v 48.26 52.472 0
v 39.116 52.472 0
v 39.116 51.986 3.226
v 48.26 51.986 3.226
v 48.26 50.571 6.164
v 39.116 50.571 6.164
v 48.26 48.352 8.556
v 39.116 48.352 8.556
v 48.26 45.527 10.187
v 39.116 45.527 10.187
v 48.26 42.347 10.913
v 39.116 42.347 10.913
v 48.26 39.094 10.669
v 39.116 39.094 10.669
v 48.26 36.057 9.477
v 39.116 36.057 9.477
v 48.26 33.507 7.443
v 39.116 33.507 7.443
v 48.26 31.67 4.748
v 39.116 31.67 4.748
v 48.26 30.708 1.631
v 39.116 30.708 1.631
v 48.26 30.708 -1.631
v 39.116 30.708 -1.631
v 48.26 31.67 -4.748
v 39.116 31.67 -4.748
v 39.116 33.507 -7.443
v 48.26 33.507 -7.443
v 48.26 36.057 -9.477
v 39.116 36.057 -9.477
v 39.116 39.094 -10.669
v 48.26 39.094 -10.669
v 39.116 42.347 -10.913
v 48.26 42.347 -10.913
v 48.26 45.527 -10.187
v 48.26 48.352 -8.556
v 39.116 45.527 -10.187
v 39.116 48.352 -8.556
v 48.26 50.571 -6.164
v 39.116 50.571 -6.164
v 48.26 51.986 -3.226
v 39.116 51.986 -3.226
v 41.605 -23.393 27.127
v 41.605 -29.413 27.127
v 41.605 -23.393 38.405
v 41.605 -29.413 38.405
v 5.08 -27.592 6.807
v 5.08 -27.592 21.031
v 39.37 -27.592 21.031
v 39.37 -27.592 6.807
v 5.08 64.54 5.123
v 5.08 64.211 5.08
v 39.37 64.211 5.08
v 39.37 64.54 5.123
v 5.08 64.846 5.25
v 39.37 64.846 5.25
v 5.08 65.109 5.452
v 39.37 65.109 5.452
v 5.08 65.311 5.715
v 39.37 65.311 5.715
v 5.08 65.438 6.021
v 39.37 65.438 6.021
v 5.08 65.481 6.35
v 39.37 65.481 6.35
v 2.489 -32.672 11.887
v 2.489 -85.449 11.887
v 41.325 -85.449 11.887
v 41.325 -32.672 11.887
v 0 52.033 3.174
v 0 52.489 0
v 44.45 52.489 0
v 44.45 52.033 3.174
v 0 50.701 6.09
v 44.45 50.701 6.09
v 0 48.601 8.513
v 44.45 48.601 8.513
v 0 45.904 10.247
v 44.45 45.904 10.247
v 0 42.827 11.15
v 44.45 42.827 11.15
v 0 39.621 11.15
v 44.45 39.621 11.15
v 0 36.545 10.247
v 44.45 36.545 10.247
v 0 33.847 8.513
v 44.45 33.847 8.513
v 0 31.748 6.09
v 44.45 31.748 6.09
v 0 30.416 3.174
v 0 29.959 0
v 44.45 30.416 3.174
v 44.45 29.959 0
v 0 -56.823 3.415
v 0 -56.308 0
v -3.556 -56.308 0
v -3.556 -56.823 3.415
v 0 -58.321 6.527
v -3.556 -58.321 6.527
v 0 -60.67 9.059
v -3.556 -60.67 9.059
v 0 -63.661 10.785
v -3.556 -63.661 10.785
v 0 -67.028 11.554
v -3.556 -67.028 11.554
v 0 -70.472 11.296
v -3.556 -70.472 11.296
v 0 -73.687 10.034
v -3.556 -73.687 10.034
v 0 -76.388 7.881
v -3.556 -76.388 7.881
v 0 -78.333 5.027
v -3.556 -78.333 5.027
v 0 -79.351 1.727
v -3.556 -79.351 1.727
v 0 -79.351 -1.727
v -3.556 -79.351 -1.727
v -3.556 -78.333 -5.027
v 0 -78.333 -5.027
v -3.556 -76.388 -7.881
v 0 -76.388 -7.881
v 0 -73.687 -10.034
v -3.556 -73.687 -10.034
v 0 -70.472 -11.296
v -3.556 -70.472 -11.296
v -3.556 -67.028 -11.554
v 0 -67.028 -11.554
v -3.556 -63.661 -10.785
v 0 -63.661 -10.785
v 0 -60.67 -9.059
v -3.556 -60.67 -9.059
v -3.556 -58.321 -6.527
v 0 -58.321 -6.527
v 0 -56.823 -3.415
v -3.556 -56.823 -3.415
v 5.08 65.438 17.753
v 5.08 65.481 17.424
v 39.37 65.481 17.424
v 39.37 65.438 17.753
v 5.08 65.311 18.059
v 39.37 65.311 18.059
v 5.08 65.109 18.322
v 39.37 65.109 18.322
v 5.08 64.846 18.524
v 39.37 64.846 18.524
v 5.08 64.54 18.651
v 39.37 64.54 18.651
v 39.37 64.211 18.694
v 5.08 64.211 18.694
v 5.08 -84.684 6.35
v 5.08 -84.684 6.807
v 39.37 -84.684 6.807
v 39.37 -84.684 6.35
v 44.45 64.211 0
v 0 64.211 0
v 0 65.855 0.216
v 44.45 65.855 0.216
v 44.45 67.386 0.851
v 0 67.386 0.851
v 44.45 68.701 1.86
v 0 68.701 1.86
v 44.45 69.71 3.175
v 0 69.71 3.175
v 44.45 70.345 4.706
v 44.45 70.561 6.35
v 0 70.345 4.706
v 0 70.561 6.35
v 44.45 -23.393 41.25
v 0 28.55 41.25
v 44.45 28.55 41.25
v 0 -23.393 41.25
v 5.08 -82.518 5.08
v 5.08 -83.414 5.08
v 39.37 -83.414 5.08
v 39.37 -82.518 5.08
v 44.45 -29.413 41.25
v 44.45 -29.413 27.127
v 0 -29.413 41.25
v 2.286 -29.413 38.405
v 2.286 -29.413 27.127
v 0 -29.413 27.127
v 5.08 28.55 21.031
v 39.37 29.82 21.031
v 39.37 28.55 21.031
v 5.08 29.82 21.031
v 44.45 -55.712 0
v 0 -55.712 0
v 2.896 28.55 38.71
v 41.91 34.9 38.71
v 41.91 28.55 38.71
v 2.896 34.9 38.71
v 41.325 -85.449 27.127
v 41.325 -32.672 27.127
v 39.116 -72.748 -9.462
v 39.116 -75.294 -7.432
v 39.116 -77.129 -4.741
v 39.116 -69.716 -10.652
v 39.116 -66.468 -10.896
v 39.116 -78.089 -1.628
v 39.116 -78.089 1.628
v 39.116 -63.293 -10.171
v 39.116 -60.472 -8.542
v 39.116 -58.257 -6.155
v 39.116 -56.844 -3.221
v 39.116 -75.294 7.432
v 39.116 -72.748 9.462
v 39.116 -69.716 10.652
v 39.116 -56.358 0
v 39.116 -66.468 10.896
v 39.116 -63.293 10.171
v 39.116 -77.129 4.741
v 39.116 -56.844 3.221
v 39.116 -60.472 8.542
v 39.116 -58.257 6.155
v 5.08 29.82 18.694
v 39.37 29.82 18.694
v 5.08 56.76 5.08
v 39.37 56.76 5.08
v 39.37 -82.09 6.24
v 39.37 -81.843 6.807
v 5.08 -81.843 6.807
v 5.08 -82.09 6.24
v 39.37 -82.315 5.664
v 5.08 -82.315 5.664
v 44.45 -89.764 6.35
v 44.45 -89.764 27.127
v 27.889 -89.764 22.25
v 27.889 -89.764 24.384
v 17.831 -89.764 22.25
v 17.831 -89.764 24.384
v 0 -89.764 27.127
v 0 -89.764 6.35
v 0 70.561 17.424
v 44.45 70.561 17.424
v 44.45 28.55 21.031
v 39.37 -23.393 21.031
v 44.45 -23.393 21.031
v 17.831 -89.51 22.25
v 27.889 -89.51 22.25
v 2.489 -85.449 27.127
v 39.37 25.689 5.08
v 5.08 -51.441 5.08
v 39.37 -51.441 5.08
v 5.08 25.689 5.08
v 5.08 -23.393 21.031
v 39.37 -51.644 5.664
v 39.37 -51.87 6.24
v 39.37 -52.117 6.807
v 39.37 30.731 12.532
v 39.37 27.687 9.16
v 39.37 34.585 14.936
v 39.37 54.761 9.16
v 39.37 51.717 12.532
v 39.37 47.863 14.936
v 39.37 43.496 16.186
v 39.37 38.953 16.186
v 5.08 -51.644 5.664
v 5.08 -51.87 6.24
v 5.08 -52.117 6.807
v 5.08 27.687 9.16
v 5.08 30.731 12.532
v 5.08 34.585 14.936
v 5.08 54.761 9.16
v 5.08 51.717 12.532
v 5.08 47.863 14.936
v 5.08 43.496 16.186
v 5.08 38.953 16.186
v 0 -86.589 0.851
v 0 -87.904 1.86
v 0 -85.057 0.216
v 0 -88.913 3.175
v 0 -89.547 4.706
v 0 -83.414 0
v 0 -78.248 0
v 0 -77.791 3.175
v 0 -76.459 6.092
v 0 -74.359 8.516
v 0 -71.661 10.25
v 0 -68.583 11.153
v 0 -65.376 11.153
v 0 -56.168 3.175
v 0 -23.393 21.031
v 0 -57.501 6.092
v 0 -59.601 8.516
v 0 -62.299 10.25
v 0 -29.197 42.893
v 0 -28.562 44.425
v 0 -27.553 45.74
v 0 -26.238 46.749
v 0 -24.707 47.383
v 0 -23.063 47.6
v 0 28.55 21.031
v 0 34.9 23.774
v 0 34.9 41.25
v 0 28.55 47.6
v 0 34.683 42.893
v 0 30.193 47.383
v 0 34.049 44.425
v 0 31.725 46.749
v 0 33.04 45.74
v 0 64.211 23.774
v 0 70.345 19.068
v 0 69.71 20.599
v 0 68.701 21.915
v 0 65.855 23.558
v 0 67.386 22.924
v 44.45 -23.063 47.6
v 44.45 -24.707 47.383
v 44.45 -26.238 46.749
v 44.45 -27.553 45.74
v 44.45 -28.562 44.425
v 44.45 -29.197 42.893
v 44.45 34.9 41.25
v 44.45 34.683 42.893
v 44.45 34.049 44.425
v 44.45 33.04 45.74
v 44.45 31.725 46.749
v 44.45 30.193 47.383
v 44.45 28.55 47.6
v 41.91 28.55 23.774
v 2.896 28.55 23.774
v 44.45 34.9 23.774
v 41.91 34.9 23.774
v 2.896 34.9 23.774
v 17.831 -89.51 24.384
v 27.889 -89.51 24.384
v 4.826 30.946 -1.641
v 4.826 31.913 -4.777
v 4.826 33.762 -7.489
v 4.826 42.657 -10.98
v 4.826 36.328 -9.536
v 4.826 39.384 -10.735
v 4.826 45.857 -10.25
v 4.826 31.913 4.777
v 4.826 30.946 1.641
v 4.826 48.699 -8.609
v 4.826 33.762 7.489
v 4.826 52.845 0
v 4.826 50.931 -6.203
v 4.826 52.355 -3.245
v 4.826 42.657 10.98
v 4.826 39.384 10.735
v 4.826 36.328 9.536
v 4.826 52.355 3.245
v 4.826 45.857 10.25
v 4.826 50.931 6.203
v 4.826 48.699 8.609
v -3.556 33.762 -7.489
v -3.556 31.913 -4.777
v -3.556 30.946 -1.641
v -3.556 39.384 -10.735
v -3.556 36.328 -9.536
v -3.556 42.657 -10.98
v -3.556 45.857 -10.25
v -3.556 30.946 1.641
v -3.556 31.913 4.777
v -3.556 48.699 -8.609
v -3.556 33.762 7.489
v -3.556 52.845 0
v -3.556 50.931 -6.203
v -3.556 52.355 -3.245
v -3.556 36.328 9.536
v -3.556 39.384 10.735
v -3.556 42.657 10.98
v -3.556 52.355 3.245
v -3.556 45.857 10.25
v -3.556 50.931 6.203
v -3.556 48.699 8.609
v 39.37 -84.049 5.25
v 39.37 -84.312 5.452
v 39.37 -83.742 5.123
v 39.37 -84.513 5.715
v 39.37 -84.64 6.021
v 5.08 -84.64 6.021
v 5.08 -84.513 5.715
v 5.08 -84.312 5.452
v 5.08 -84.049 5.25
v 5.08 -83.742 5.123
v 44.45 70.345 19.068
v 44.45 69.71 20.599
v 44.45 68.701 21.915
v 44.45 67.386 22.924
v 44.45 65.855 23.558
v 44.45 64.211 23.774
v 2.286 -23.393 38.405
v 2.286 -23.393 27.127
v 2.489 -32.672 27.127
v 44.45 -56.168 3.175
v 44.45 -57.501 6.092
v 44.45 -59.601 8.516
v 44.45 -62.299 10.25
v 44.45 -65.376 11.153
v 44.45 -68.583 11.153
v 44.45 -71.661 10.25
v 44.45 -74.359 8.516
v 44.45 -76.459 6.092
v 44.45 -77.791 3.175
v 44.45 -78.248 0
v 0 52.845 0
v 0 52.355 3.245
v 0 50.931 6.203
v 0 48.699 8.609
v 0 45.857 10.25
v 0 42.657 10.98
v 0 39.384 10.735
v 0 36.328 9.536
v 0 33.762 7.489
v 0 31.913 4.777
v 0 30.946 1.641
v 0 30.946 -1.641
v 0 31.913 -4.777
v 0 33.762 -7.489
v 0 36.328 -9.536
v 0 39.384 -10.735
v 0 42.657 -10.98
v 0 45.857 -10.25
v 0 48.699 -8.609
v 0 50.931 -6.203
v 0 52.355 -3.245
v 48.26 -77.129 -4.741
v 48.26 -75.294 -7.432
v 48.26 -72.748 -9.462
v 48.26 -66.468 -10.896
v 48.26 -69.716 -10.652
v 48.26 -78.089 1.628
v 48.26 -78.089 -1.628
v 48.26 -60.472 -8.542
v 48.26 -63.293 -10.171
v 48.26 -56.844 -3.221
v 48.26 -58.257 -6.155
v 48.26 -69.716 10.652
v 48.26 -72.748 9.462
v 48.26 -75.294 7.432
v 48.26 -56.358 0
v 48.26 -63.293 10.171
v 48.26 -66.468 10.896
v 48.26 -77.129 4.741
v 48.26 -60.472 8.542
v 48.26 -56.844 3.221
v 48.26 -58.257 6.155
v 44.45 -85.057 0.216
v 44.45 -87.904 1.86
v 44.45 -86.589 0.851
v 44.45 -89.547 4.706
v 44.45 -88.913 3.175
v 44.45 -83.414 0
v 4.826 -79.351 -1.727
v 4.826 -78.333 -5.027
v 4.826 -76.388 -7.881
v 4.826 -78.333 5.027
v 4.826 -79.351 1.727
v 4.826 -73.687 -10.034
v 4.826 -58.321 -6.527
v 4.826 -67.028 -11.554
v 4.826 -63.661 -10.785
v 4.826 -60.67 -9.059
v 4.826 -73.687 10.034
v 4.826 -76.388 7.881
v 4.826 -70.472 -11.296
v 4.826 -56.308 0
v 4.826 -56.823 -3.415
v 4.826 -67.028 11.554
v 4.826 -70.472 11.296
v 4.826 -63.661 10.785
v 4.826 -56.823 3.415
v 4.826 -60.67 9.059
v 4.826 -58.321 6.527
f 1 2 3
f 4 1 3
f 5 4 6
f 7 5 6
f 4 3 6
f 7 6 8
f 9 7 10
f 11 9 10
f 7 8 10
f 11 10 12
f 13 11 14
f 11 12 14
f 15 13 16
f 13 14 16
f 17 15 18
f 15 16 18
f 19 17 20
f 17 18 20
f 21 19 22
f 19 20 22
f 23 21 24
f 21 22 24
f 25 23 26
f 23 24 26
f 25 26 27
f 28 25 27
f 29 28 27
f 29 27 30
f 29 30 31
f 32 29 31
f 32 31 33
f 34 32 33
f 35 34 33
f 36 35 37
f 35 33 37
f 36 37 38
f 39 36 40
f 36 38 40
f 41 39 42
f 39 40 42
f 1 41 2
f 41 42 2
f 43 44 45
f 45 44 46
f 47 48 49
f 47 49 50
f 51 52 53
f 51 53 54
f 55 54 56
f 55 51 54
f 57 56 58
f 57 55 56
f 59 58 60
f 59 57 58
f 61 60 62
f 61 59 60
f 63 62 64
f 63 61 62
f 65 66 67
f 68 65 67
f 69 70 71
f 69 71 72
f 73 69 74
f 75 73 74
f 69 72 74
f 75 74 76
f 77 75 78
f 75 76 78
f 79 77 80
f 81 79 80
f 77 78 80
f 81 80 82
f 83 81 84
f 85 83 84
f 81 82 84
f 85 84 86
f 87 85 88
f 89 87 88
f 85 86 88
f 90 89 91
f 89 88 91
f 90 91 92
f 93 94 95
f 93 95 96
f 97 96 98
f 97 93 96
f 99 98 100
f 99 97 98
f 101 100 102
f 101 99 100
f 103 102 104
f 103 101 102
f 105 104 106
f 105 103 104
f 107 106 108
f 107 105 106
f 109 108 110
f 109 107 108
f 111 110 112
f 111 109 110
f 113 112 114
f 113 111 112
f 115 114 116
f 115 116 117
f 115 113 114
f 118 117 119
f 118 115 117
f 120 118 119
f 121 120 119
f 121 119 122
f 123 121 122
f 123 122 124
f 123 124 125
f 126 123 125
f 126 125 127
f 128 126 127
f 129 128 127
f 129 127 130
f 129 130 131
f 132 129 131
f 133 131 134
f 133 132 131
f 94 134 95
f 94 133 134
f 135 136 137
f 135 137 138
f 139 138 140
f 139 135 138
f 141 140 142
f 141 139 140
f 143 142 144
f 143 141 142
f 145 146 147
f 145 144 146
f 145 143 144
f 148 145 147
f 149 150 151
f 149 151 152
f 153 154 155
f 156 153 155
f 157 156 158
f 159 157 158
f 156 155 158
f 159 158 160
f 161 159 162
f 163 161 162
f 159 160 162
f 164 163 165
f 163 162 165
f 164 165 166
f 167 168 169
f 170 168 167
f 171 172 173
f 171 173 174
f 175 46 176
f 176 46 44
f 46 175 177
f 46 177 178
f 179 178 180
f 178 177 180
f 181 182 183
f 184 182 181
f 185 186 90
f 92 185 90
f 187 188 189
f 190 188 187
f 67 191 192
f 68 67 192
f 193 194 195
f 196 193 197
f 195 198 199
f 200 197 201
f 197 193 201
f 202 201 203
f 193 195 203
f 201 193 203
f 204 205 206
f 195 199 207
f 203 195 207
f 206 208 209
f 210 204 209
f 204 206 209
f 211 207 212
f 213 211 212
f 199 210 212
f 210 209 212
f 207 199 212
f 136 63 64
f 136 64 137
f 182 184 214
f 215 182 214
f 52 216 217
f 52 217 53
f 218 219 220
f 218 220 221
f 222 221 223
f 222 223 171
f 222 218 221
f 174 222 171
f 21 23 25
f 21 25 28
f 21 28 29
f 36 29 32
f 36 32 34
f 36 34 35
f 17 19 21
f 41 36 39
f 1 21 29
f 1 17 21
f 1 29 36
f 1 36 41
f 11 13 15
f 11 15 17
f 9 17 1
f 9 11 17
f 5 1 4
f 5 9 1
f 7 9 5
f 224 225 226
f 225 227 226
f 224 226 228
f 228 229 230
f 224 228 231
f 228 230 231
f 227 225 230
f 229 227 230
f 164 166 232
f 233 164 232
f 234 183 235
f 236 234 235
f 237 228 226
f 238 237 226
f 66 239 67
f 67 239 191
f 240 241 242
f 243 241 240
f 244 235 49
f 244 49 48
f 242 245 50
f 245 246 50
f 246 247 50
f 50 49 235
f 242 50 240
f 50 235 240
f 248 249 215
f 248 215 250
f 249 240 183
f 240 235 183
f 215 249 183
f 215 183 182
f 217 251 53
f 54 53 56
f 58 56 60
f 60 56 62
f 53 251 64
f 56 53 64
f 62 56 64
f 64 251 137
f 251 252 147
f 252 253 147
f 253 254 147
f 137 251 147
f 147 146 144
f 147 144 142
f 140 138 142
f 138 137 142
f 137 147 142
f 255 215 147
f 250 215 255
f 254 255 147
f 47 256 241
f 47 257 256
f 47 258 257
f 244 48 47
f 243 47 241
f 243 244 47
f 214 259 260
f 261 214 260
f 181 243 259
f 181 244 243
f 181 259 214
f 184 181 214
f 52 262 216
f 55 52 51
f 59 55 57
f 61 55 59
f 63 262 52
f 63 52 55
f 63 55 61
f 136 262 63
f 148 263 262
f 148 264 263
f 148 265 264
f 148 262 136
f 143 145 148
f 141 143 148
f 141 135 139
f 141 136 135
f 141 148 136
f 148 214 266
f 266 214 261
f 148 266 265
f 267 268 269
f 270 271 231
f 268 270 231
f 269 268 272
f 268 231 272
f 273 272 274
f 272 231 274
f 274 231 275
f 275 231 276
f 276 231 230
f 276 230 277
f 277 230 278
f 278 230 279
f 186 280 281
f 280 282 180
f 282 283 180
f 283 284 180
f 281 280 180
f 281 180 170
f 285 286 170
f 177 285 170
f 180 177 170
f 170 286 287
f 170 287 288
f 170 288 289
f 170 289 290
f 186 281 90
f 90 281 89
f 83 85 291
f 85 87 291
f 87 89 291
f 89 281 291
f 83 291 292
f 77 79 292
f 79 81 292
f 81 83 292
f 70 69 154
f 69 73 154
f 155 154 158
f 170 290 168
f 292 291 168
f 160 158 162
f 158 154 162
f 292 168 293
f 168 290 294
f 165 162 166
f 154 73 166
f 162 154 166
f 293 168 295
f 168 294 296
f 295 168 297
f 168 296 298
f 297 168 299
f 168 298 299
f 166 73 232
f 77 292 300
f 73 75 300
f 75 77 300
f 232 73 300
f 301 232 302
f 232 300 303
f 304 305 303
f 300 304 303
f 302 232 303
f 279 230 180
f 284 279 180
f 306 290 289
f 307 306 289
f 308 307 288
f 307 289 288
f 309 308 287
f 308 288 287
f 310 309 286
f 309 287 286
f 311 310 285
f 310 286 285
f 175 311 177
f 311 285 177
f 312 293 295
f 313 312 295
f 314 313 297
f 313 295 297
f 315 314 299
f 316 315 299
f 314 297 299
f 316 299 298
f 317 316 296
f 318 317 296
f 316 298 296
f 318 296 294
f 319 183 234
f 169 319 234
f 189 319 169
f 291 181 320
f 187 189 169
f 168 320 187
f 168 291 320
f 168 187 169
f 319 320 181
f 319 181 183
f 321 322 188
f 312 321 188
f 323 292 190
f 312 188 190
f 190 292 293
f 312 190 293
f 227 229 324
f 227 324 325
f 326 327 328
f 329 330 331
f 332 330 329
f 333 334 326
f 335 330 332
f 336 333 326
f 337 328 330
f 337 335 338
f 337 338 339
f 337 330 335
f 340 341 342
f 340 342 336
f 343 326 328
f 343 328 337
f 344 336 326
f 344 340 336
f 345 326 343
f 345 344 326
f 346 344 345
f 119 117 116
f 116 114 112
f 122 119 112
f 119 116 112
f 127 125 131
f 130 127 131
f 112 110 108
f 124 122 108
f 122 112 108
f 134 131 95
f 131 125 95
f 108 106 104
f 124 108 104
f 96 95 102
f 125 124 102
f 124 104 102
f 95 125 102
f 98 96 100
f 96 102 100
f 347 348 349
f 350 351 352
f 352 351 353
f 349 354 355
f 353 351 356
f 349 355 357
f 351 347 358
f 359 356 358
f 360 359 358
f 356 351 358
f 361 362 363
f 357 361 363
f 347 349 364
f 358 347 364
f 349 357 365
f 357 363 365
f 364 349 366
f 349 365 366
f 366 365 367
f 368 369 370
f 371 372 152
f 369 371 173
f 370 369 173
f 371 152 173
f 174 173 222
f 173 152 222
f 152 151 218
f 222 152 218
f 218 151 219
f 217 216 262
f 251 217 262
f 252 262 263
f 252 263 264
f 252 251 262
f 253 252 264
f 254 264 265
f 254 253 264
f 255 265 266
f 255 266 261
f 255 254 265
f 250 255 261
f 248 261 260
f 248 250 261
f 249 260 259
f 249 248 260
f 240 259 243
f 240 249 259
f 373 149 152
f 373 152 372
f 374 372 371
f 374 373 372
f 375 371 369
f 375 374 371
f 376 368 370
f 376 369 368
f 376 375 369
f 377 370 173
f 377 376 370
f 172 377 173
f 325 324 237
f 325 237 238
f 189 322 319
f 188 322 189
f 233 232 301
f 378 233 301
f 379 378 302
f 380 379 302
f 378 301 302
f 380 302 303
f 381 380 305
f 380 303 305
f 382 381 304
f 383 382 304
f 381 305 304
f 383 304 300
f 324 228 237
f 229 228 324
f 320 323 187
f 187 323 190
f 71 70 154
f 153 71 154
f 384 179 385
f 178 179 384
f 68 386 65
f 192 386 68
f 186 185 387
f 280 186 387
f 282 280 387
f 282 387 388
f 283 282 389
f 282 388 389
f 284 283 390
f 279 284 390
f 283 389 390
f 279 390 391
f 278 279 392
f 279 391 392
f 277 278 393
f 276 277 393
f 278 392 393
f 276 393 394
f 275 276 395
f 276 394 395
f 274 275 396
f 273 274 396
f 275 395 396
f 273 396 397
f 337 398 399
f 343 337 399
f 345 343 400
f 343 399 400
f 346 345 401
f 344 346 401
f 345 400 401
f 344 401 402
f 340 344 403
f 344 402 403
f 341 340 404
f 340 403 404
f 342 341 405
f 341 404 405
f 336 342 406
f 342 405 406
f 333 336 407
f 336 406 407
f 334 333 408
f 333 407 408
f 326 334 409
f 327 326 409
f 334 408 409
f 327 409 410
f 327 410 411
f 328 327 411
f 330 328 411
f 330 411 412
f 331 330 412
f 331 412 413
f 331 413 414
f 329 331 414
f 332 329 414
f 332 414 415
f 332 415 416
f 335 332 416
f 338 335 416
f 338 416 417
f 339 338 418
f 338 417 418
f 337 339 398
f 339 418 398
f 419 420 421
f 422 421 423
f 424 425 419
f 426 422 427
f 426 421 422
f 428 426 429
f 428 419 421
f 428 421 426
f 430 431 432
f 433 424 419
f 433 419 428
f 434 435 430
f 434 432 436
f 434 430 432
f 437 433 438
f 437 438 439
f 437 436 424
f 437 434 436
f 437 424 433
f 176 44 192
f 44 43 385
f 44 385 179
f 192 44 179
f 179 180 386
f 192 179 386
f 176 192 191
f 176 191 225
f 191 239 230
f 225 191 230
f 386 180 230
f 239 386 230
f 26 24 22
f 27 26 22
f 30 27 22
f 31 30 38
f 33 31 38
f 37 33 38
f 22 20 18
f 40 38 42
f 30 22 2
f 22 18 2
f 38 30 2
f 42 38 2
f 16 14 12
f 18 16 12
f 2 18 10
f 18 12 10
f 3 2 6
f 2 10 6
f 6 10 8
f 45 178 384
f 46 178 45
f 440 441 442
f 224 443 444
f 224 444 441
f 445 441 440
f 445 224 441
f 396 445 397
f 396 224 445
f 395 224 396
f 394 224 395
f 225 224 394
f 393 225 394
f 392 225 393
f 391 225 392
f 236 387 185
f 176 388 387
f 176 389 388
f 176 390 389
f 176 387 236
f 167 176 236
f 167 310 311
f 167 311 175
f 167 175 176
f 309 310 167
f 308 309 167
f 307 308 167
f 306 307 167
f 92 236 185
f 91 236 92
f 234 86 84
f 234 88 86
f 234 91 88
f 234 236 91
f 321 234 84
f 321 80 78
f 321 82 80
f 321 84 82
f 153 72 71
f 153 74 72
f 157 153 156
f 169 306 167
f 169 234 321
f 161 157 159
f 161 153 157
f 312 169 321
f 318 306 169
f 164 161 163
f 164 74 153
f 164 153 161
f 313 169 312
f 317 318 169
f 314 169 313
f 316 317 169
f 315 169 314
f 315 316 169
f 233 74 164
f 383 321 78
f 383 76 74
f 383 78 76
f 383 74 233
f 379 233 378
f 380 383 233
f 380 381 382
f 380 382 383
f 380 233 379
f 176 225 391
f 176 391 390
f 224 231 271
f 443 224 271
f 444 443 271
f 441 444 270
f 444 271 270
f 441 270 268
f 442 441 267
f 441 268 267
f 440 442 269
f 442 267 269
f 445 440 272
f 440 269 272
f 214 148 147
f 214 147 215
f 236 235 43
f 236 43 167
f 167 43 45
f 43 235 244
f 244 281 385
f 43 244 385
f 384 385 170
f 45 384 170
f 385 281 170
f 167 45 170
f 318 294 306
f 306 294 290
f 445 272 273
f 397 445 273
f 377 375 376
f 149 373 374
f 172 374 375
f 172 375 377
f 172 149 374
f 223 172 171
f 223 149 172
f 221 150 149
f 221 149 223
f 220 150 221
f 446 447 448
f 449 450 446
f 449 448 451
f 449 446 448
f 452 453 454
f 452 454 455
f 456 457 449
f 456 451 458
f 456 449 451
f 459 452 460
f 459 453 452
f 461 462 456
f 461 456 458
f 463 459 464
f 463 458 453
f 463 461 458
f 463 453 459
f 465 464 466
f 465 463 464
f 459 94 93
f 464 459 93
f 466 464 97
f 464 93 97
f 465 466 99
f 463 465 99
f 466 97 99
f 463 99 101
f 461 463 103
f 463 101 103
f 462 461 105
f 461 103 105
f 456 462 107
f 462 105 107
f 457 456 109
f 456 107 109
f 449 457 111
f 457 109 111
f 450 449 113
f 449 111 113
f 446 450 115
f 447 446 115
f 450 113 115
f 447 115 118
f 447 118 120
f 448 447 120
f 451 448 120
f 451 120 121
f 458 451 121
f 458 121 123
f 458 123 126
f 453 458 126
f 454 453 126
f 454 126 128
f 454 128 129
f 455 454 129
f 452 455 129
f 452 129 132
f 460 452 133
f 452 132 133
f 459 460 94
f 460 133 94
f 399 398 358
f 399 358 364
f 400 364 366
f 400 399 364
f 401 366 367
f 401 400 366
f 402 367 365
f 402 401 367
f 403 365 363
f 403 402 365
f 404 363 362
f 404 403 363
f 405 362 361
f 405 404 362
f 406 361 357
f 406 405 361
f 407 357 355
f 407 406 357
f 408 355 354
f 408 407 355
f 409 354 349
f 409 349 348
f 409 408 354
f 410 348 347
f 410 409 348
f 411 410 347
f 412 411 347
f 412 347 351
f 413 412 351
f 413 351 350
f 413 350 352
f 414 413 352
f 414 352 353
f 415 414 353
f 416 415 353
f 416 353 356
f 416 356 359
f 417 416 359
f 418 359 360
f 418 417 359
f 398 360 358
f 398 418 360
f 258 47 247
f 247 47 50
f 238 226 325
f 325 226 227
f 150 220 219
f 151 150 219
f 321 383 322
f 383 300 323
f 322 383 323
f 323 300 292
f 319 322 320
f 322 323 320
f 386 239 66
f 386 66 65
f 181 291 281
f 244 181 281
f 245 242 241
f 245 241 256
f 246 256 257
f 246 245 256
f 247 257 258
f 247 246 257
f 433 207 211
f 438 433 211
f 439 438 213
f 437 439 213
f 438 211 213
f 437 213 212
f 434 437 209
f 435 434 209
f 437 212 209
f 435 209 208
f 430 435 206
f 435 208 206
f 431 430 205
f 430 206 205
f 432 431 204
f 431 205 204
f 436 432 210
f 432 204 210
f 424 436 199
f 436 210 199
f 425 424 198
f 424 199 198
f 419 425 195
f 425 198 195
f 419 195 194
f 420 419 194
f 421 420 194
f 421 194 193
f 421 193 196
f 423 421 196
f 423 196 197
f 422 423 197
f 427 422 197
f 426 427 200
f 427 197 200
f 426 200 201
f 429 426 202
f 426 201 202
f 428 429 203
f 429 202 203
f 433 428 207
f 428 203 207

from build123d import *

# Parameters (mm, degrees)
F1_DEPTH      = 44.45
F3_DEPTH      = 46.99
F4_W          = 38.835483836
F4_H          = 52.7764223516
F5_DEPTH      = 15.24
F7_START      = 39.116
F6_R          = 10.9261370184
F7_DEPTH      = 9.144
F6_R_2        = 10.9431249162
F8_R          = 11.010831959
F9_DEPTH      = 3.556
F9_DEPTH_BACK = 4.826
F8_R_2        = 11.5864067576
F10_W         = 10.0583992898
F10_H         = 2.1336004138
F11_DEPTH     = 0.254
F12_W         = 51.9430035889
F12_H         = 20.2183979881
F13_DEPTH     = 55.118
F14_W         = 39.3191990443
F14_H         = 11.2776011229
F15_DEPTH     = 25.4
F16_T         = 5.08
F16_T3_DEPTH  = 54.61
F16_T5_DEPTH  = 12.4460015742
F16_T7_DEPTH  = 13.0047993815
F16_T9_DEPTH  = 16.1797990388
F16_T11_DEPTH = 25.4
F16_T13_DEPTH = 62.9364223516
F16_T15_DEPTH = 48.995483836
F16_T17_DEPTH = 10.414
F16_T19_DEPTH = 12.2936004138
F16_T21_DEPTH = 20.2183992898
F17_W         = 39.0143997502
F17_H         = 14.9351991713
F18_DEPTH     = 25.4


# Not quite as in the source:
# - a shell that OpenCascade refuses in one call is made with other operations: the cavity is built on its own and cut out


with BuildPart() as f1:
    # F0 (on Right) → F1 (new body)
    with BuildSketch(Plane.YZ):
        with BuildLine():
            Line((34.8995998502, 0), (34.8995998502, 23.7744003534))
            Line((34.8995998502, 23.7744003534), (34.8995998502, 41.2495988739))
            ThreePointArc((34.8995998502, 41.2495988739), (33.0397279107, 45.7397269344), (28.5495998502, 47.5995988739))
            Line((28.5495998502, 47.5995988739), (-23.0632027775, 47.5995988739))
            ThreePointArc((-23.0632027775, 47.5995988739), (-27.553330838, 45.7397269344), (-29.4132027775, 41.2495988739))
            Line((-29.4132027775, 41.2495988739), (-29.4132027775, 27.127198875))
            Line((-29.4132027775, 27.127198875), (-29.4132027775, 0))
            Line((-29.4132027775, 0), (34.8995998502, 0))
        make_face()
        with BuildLine():
            Line((-83.4136041045, 0), (-29.4132027775, 0))
            Line((-29.4132027775, 0), (-29.4132027775, 27.127198875))
            Line((-29.4132027775, 27.127198875), (-89.7636041045, 27.127198875))
            Line((-89.7636041045, 27.127198875), (-89.7636041045, 6.35))
            ThreePointArc((-89.7636041045, 6.35), (-87.9037321651, 1.8598719395), (-83.4136041045, 0))
        make_face()
        with BuildLine():
            Line((64.2112003803, 23.7744003534), (34.8995998502, 23.7744003534))
            Line((34.8995998502, 23.7744003534), (34.8995998502, 0))
            Line((34.8995998502, 0), (64.2112003803, 0))
            ThreePointArc((64.2112003803, 0), (68.7013284409, 1.8598719395), (70.5612003803, 6.35))
            Line((70.5612003803, 6.35), (70.5612003803, 17.4244003534))
            ThreePointArc((70.5612003803, 17.4244003534), (68.7013284409, 21.914528414), (64.2112003803, 23.7744003534))
        make_face()
    extrude(amount=F1_DEPTH)

    # F2 (on face) → F3 (cut)
    with BuildSketch(Plane.YZ.offset(44.45)):
        with BuildLine():
            ThreePointArc((52.4891002785, 0), (41.2242002785, 11.2649), (29.9593002785, 0))
            Line((29.9593002785, 0), (52.4891002785, 0))
        make_face()
        with BuildLine():
            Line((-78.2477574524, 0), (-55.7118488375, 0))
            ThreePointArc((-55.7118488375, 0), (-66.9798031449, 11.2679543074), (-78.2477574524, 0))
        make_face()
        with BuildLine():
            Line((52.4891002785, 0), (29.9593002785, 0))
            ThreePointArc((29.9593002785, 0), (41.2242002785, -11.2649), (52.4891002785, 0))
        make_face()
        with BuildLine():
            ThreePointArc((-78.2477574524, 0), (-66.9798031449, -11.2679543074), (-55.7118488375, 0))
            Line((-55.7118488375, 0), (-78.2477574524, 0))
        make_face()
    extrude(amount=-F3_DEPTH, mode=Mode.SUBTRACT)

    # F4 (on face) → F5 (cut)
    with BuildSketch(Plane.XY.offset(27.127198875)):
        with Locations((21.9071976608, -59.0603370219)):
            Rectangle(F4_W, F4_H)
    extrude(amount=-F5_DEPTH, mode=Mode.SUBTRACT)

    # F10 (on face) → F11 (cut)
    with BuildSketch(Plane.XZ.offset(89.7636041045)):
        with Locations((22.85999991, 23.317201063)):
            Rectangle(F10_W, F10_H)
    extrude(amount=-F11_DEPTH, mode=Mode.SUBTRACT)

    # F12 (on face) → F13 (cut)
    with BuildSketch(Plane(origin=(0, 0, 0), x_dir=(0, -1, 0), z_dir=(-1, 0, 0))):
        with Locations((-2.5780980557, 31.1403998798)):
            Rectangle(F12_W, F12_H)
    extrude(amount=-F13_DEPTH, mode=Mode.SUBTRACT)

    # F14 (on face) → F15 (cut)
    with BuildSketch(Plane.XZ.offset(29.4132027775)):
        with Locations((21.9456010964, 32.7659994364)):
            Rectangle(F14_W, F14_H)
    extrude(amount=-F15_DEPTH, mode=Mode.SUBTRACT)

    # F16: shell of thickness 5.08, made by hand


with BuildPart() as f7:
    # F6 (on Right) → F7 (new body)
    with BuildSketch(Plane.YZ.offset(F7_START)):
        with Locations((-67.2845989466, 0)):
            Circle(F6_R)
    extrude(amount=F7_DEPTH)


with BuildPart() as f7b:
    # F6 (on Right) → F7, piece 2 (new body)
    with BuildSketch(Plane.YZ.offset(F7_START)):
        with Locations((41.5289998055, 0)):
            Circle(F6_R_2)
    extrude(amount=F7_DEPTH)


with BuildPart() as f9:
    # F8 (on Right) → F9 (new body, two sides)
    with BuildSketch(Plane.YZ) as f9_sk:
        with Locations((41.8337993324, 0)):
            Circle(F8_R)
    extrude(amount=-F9_DEPTH)
    extrude(f9_sk.sketch, amount=F9_DEPTH_BACK)


with BuildPart() as f9b:
    # F8 (on Right) → F9, piece 2 (new body, two sides)
    with BuildSketch(Plane.YZ) as f9_2_sk:
        with Locations((-67.8941980004, 0)):
            Circle(F8_R_2)
    extrude(amount=-F9_DEPTH)
    extrude(f9_2_sk.sketch, amount=F9_DEPTH_BACK)


with BuildPart() as f16_core1:
    # F16_t2: copy of F1
    add(f1.part)

    # the walls: a layer under each face that stays
    f16_faces = [f16_core1.faces().sort_by_distance(p)[0] for p in [
        (22.225, 34.8995998502, 32.5119996136),
        (22.225, 49.5554001153, 23.7744003534),
        (22.225, 33.0397279107, 45.7397269344),
        (0, -63.042803357, 23.7997994369),
        (44.45, -63.042803357, 23.7997994369),
        (22.225, 68.7013284409, 21.914528414),
        (22.225, 2.7431985363, 47.5995988739),
        (22.225, 70.5612003803, 11.8872001767),
        (22.225, 68.7013284409, 1.8598719395),
        (22.225, 58.3501503294, 0),
        (22.225, -27.553330838, 45.7397269344),
        (22.225, 41.2242002785, 11.2649),
        (37.0416666667, -29.4132027775, 38.8958655407),
        (22.225, -12.8762742795, 0),
        (41.275, -28.1341323363, 27.127198875),
        (22.225, -66.9798031449, 11.2679543074),
        (22.225, -89.7636041045, 16.7385994375),
        (22.225, -80.8306807784, 0),
        (22.225, -87.9037321651, 1.8598719395),
        (22.225, 28.5495998502, 31.1403998798),
        (22.225, 2.5780980557, 41.2495988739),
        (37.0416666667, -23.3934037387, 24.4009338838),
        (2.2860015742, -26.4033032581, 32.7659994364),
        (21.9456010964, -26.4033032581, 38.4047999978),
        (41.6052006185, -26.4033032581, 32.7659994364),
        (41.3249395788, -59.0603370219, 19.507198875),
        (21.9071976608, -85.4485481977, 19.507198875),
        (2.4894557428, -59.0603370219, 19.507198875),
        (21.9071976608, -32.6721258461, 19.507198875),
        (27.8891995549, -89.6366041045, 23.317201063),
        (22.85999991, -89.6366041045, 22.2504008561),
        (17.8308002651, -89.6366041045, 23.317201063),
        (22.85999991, -89.6366041045, 24.3840012699),
        (21.9071976608, -59.0603370219, 11.887198875),
        (22.85999991, -89.5096041045, 23.317201063),
    ]]
    thicken(f16_faces, amount=-F16_T, mode=Mode.SUBTRACT)

    # F16_s4 → F16_t3 (cut)
    with BuildSketch(Plane.YZ.offset(-5.08)):
        Polygon((34.9503998502, 23.8252003534), (29.8195998502, 23.7744003534), (29.8195998502, 18.6944003534), (34.8995998502, 18.6944003534), align=None)
        Polygon((28.4987998502, 41.1987988739), (33.6295998502, 41.2495988739), (33.6295998502, 46.3295988739), (28.5495998502, 46.3295988739), align=None)
        Polygon((-23.3426037387, 41.1987988739), (-23.3934037387, 46.3295988739), (-28.4734037387, 46.3295988739), (-28.4734037387, 41.2495988739), align=None)
    extrude(amount=F16_T3_DEPTH, mode=Mode.SUBTRACT)

    # F16_s6 → F16_t5 (cut)
    with BuildSketch(Plane.YZ.offset(-5.08)):
        Polygon((-29.4640027775, 27.177998875), (-24.3332027775, 27.127198875), (-24.3332027775, 22.047198875), (-29.4132027775, 22.047198875), align=None)
    extrude(amount=F16_T5_DEPTH, mode=Mode.SUBTRACT)

    # F16_s8 → F16_t7 (cut)
    with BuildSketch(Plane.YZ.offset(36.5252006185)):
        Polygon((-29.4640027775, 27.177998875), (-24.3332027775, 27.127198875), (-24.3332027775, 22.047198875), (-29.4132027775, 22.047198875), align=None)
    extrude(amount=F16_T7_DEPTH, mode=Mode.SUBTRACT)

    # F16_s10 → F16_t9 (cut)
    with BuildSketch(Plane.XZ.offset(18.3134037387)):
        Polygon((2.3368015742, 27.177998875), (2.2860015742, 22.047198875), (-2.7939984258, 22.047198875), (-2.7939984258, 27.127198875), align=None)
        Polygon((41.5544006185, 27.177998875), (41.6052006185, 22.047198875), (46.6852006185, 22.047198875), (46.6852006185, 27.127198875), align=None)
        Polygon((2.3368015742, 38.3539999978), (-2.7939984258, 38.4047999978), (-2.7939984258, 43.4847999978), (2.2860015742, 43.4847999978), align=None)
        Polygon((41.5544006185, 38.3539999978), (41.6052006185, 43.4847999978), (46.6852006185, 43.4847999978), (46.6852006185, 38.4047999978), align=None)
    extrude(amount=F16_T9_DEPTH, mode=Mode.SUBTRACT)

    # F16_s12 → F16_t11 (cut)
    with BuildSketch(Plane.XY.offset(6.807198875)):
        Polygon((41.2741395788, -85.3977481977), (46.4049395788, -85.4485481977), (46.4049395788, -90.5285481977), (41.3249395788, -90.5285481977), align=None)
        Polygon((41.2741395788, -32.7229258461), (46.4049395788, -32.6721258461), (46.4049395788, -27.5921258461), (41.3249395788, -27.5921258461), align=None)
        Polygon((2.5402557428, -85.3977481977), (2.4894557428, -90.5285481977), (-2.5905442572, -90.5285481977), (-2.5905442572, -85.4485481977), align=None)
        Polygon((2.5402557428, -32.7229258461), (-2.5905442572, -32.6721258461), (-2.5905442572, -27.5921258461), (2.4894557428, -27.5921258461), align=None)
    extrude(amount=F16_T11_DEPTH, mode=Mode.SUBTRACT)

    # F16_s14 → F16_t13 (cut)
    with BuildSketch(Plane.XZ.offset(27.5921258461)):
        Polygon((41.2741395788, 11.937998875), (46.4049395788, 11.887198875), (46.4049395788, 6.807198875), (41.3249395788, 6.807198875), align=None)
        Polygon((2.5402557428, 11.937998875), (-2.5905442572, 11.887198875), (-2.5905442572, 6.807198875), (2.4894557428, 6.807198875), align=None)
    extrude(amount=F16_T13_DEPTH, mode=Mode.SUBTRACT)

    # F16_s16 → F16_t15 (cut)
    with BuildSketch(Plane.YZ.offset(-2.5905442572)):
        Polygon((-85.3977481977, 11.937998875), (-90.5285481977, 11.887198875), (-90.5285481977, 6.807198875), (-85.4485481977, 6.807198875), align=None)
        Polygon((-32.7229258461, 11.937998875), (-27.5921258461, 11.887198875), (-27.5921258461, 6.807198875), (-32.6721258461, 6.807198875), align=None)
    extrude(amount=F16_T15_DEPTH, mode=Mode.SUBTRACT)

    # F16_s18 → F16_t17 (cut)
    with BuildSketch(Plane.XZ.offset(84.4296041045)):
        Polygon((27.8383995549, 22.3012008561), (32.9691995549, 22.2504008561), (32.9691995549, 17.1704008561), (27.8891995549, 17.1704008561), align=None)
        Polygon((27.8383995549, 24.3332012699), (32.9691995549, 24.3840012699), (32.9691995549, 29.4640012699), (27.8891995549, 29.4640012699), align=None)
        Polygon((17.8816002651, 22.3012008561), (17.8308002651, 17.1704008561), (12.7508002651, 17.1704008561), (12.7508002651, 22.2504008561), align=None)
        Polygon((17.8816002651, 24.3332012699), (12.7508002651, 24.3840012699), (12.7508002651, 29.4640012699), (17.8308002651, 29.4640012699), align=None)
    extrude(amount=F16_T17_DEPTH, mode=Mode.SUBTRACT)

    # F16_s20 → F16_t19 (cut)
    with BuildSketch(Plane.XY.offset(17.1704008561)):
        Polygon((27.8383995549, -89.5604041045), (32.9691995549, -89.5096041045), (32.9691995549, -84.4296041045), (27.8891995549, -84.4296041045), align=None)
        Polygon((17.8816002651, -89.5604041045), (12.7508002651, -89.5096041045), (12.7508002651, -84.4296041045), (17.8308002651, -84.4296041045), align=None)
    extrude(amount=F16_T19_DEPTH, mode=Mode.SUBTRACT)

    # F16_s22 → F16_t21 (cut)
    with BuildSketch(Plane.YZ.offset(12.7508002651)):
        Polygon((-89.5604041045, 22.3012008561), (-89.5096041045, 17.1704008561), (-84.4296041045, 17.1704008561), (-84.4296041045, 22.2504008561), align=None)
        Polygon((-89.5604041045, 24.3332012699), (-89.5096041045, 29.4640012699), (-84.4296041045, 29.4640012699), (-84.4296041045, 24.3840012699), align=None)
    extrude(amount=F16_T21_DEPTH, mode=Mode.SUBTRACT)


with BuildPart() as f1_1:
    add(f1.part)

    # what is left inside the walls is the cavity
    f16_cavity = [f16_core1.part.solids().sort_by_distance(p)[0] for p in [
        (27.94, -12.876195, 5.1308),
        (22.225, -83.73677, 6.756399),
    ]]
    add(f16_cavity, mode=Mode.SUBTRACT)

    # F17 (on face) → F18 (cut)
    with BuildSketch(Plane(origin=(0, 34.8995998502, 0), x_dir=(-1, 0, 0), z_dir=(0, 1, 0))):
        with Locations((-22.4028002704, 31.2419999391)):
            Rectangle(F17_W, F17_H)
    extrude(amount=-F18_DEPTH, mode=Mode.SUBTRACT)


solid = Compound([f7.part, f7b.part, f9.part, f9b.part, f1_1.part])
